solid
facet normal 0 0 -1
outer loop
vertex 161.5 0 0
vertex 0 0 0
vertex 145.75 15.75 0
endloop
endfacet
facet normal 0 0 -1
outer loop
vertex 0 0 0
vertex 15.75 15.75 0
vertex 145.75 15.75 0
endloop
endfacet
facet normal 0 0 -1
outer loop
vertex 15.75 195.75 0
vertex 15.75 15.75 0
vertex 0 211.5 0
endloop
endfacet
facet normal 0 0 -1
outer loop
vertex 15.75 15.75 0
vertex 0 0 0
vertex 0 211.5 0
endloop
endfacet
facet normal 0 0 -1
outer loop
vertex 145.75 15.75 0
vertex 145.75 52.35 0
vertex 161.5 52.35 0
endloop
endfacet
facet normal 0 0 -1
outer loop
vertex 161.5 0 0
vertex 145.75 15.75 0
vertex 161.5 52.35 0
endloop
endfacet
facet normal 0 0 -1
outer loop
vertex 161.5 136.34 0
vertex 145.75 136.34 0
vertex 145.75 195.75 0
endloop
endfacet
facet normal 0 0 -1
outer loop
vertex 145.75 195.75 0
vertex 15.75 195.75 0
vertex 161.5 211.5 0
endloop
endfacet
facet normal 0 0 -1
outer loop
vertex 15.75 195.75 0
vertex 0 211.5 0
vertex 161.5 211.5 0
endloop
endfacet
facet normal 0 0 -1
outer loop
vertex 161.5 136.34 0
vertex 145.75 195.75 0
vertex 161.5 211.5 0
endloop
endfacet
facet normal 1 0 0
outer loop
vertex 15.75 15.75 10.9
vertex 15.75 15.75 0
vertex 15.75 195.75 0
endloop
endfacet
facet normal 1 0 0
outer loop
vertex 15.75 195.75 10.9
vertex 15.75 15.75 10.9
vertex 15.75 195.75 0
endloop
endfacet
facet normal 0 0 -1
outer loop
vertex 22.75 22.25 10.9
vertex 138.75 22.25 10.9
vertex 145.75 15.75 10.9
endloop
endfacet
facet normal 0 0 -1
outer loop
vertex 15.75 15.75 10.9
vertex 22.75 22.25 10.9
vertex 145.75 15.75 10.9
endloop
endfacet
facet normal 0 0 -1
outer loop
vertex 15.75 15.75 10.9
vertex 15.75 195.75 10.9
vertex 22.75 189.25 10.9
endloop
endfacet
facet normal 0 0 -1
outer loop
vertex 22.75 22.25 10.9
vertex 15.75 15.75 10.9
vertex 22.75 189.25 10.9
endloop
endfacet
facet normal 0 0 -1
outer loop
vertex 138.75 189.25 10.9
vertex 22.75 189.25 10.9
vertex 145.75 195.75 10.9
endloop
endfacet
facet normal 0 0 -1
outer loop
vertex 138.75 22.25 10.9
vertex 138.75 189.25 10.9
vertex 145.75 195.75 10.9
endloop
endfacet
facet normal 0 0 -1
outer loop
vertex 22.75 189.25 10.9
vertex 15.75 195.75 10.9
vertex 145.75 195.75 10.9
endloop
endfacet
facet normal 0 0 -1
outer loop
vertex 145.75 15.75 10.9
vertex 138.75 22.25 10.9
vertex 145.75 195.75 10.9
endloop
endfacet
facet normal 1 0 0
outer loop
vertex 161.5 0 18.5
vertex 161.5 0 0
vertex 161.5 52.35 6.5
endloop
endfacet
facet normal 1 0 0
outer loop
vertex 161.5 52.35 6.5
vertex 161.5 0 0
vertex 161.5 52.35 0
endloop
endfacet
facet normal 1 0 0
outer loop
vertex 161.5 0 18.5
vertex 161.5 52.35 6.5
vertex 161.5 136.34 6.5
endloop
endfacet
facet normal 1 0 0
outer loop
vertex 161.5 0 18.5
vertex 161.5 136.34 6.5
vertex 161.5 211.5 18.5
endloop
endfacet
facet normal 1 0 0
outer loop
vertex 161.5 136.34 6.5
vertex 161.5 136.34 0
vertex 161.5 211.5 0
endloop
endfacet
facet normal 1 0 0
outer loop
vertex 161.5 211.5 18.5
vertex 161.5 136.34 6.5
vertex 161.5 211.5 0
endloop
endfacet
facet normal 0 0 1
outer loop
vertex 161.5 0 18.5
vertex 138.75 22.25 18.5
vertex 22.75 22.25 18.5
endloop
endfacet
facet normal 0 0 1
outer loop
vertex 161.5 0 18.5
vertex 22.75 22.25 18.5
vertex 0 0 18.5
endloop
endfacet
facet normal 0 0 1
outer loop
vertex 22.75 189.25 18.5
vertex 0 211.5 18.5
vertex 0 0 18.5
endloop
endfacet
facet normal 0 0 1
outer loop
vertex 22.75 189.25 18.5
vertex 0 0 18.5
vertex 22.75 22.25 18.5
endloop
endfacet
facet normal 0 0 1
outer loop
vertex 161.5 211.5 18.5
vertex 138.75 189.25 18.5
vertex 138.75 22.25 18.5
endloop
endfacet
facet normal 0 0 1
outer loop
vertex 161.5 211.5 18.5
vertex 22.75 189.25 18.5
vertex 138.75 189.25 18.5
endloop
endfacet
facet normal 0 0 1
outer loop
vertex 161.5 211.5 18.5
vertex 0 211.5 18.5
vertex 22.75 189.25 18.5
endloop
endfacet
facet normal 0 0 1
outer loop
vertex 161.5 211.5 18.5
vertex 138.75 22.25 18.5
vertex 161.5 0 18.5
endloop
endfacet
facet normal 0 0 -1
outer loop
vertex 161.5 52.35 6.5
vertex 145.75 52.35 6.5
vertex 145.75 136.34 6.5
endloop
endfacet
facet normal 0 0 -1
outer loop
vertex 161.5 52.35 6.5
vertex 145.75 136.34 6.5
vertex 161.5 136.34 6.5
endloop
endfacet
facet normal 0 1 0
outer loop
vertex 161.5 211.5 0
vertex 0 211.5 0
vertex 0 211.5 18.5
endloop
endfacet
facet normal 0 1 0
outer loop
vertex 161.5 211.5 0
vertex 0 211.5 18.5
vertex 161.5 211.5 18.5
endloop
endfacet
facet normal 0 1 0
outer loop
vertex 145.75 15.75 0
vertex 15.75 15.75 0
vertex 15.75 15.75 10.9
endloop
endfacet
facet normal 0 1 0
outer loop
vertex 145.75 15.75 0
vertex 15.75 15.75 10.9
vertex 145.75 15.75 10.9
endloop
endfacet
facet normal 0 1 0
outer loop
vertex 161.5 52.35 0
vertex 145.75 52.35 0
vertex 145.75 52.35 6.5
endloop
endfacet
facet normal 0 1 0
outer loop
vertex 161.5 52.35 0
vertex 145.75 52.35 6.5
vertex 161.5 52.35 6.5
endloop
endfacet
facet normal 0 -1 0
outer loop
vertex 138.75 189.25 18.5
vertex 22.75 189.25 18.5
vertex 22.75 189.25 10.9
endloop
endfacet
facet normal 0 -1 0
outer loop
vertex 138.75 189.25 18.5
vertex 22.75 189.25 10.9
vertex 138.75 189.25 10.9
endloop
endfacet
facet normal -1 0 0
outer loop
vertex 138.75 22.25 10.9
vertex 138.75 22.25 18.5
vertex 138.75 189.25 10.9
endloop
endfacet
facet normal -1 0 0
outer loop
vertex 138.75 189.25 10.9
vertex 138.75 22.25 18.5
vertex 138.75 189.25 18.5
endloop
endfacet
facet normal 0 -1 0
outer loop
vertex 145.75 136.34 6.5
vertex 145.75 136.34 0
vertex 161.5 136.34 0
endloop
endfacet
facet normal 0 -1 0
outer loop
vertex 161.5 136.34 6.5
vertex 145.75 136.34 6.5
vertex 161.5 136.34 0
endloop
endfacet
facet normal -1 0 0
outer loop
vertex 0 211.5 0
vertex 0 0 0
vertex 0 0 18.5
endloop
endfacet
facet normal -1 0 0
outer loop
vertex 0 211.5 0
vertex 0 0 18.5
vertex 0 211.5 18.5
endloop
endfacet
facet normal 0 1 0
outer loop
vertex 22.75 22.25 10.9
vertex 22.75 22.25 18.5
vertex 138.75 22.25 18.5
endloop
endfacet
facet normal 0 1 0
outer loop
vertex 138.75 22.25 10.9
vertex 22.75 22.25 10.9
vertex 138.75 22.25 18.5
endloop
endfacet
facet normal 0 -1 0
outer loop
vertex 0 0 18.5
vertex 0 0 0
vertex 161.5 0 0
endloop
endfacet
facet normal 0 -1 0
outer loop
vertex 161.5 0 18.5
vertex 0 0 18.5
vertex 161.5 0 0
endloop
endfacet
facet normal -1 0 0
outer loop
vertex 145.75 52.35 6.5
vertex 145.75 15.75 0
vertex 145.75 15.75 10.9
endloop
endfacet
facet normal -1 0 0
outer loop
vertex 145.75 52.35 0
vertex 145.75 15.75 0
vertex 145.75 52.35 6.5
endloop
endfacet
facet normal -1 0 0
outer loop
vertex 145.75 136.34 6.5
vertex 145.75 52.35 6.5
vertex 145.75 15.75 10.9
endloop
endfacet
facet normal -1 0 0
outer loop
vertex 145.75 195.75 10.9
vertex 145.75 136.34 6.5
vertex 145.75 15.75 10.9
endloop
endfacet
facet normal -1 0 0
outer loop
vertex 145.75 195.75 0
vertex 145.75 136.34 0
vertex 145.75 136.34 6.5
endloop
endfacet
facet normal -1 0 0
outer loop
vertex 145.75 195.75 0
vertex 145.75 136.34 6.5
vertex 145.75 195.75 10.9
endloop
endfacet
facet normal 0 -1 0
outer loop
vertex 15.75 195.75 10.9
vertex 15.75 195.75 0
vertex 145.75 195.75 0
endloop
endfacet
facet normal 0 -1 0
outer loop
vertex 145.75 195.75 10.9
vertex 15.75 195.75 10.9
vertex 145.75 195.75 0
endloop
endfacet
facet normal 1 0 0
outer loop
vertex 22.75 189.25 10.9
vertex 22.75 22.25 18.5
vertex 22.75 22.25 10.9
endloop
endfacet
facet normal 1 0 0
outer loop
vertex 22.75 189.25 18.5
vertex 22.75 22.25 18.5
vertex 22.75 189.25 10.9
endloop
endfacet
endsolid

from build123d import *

# Parameters (mm, degrees)
SKETCH003_W     = 161.5
SKETCH003_H     = 211.5
SKETCH003_W_2   = 130
SKETCH003_H_2   = 180
PAD002_DEPTH    = 18.5
SKETCH004_W     = 142.953762
SKETCH004_H     = 192.038153
SKETCH004_W_2   = 116
SKETCH004_H_2   = 167
PAD003_DEPTH    = 7.6
SKETCH011_W     = 36.28281
SKETCH011_H     = 83.99005
POCKET002_DEPTH = 6.5


with BuildPart() as part:
    # Sketch003 (on XY_Plane031 of Origin062) → Pad002 (new body)
    with BuildSketch(Plane.XY):
        with Locations((80.75, 105.75)):
            Rectangle(SKETCH003_W, SKETCH003_H)
        with Locations((80.75, 105.75)):
            Rectangle(SKETCH003_W_2, SKETCH003_H_2, mode=Mode.SUBTRACT)
    extrude(amount=PAD002_DEPTH)

    # Sketch004 (on Face10 of Pad002) → Pad003 (join)
    with BuildSketch(Plane.XY.offset(18.5)):
        with Locations((79.935823, 103.608654)):
            Rectangle(SKETCH004_W, SKETCH004_H)
        with Locations((80.75, 105.75)):
            Rectangle(SKETCH004_W_2, SKETCH004_H_2, mode=Mode.SUBTRACT)
    extrude(amount=-PAD003_DEPTH)

    # Sketch011 (on Face4 of Pad003) → Pocket002 (cut)
    with BuildSketch(Plane(origin=(0, 0, 0), x_dir=(1, 0, 0), z_dir=(0, 0, -1))):
        with Locations((161.891405, -94.345025)):
            Rectangle(SKETCH011_W, SKETCH011_H)
    extrude(amount=-POCKET002_DEPTH, mode=Mode.SUBTRACT)


solid = part.part
